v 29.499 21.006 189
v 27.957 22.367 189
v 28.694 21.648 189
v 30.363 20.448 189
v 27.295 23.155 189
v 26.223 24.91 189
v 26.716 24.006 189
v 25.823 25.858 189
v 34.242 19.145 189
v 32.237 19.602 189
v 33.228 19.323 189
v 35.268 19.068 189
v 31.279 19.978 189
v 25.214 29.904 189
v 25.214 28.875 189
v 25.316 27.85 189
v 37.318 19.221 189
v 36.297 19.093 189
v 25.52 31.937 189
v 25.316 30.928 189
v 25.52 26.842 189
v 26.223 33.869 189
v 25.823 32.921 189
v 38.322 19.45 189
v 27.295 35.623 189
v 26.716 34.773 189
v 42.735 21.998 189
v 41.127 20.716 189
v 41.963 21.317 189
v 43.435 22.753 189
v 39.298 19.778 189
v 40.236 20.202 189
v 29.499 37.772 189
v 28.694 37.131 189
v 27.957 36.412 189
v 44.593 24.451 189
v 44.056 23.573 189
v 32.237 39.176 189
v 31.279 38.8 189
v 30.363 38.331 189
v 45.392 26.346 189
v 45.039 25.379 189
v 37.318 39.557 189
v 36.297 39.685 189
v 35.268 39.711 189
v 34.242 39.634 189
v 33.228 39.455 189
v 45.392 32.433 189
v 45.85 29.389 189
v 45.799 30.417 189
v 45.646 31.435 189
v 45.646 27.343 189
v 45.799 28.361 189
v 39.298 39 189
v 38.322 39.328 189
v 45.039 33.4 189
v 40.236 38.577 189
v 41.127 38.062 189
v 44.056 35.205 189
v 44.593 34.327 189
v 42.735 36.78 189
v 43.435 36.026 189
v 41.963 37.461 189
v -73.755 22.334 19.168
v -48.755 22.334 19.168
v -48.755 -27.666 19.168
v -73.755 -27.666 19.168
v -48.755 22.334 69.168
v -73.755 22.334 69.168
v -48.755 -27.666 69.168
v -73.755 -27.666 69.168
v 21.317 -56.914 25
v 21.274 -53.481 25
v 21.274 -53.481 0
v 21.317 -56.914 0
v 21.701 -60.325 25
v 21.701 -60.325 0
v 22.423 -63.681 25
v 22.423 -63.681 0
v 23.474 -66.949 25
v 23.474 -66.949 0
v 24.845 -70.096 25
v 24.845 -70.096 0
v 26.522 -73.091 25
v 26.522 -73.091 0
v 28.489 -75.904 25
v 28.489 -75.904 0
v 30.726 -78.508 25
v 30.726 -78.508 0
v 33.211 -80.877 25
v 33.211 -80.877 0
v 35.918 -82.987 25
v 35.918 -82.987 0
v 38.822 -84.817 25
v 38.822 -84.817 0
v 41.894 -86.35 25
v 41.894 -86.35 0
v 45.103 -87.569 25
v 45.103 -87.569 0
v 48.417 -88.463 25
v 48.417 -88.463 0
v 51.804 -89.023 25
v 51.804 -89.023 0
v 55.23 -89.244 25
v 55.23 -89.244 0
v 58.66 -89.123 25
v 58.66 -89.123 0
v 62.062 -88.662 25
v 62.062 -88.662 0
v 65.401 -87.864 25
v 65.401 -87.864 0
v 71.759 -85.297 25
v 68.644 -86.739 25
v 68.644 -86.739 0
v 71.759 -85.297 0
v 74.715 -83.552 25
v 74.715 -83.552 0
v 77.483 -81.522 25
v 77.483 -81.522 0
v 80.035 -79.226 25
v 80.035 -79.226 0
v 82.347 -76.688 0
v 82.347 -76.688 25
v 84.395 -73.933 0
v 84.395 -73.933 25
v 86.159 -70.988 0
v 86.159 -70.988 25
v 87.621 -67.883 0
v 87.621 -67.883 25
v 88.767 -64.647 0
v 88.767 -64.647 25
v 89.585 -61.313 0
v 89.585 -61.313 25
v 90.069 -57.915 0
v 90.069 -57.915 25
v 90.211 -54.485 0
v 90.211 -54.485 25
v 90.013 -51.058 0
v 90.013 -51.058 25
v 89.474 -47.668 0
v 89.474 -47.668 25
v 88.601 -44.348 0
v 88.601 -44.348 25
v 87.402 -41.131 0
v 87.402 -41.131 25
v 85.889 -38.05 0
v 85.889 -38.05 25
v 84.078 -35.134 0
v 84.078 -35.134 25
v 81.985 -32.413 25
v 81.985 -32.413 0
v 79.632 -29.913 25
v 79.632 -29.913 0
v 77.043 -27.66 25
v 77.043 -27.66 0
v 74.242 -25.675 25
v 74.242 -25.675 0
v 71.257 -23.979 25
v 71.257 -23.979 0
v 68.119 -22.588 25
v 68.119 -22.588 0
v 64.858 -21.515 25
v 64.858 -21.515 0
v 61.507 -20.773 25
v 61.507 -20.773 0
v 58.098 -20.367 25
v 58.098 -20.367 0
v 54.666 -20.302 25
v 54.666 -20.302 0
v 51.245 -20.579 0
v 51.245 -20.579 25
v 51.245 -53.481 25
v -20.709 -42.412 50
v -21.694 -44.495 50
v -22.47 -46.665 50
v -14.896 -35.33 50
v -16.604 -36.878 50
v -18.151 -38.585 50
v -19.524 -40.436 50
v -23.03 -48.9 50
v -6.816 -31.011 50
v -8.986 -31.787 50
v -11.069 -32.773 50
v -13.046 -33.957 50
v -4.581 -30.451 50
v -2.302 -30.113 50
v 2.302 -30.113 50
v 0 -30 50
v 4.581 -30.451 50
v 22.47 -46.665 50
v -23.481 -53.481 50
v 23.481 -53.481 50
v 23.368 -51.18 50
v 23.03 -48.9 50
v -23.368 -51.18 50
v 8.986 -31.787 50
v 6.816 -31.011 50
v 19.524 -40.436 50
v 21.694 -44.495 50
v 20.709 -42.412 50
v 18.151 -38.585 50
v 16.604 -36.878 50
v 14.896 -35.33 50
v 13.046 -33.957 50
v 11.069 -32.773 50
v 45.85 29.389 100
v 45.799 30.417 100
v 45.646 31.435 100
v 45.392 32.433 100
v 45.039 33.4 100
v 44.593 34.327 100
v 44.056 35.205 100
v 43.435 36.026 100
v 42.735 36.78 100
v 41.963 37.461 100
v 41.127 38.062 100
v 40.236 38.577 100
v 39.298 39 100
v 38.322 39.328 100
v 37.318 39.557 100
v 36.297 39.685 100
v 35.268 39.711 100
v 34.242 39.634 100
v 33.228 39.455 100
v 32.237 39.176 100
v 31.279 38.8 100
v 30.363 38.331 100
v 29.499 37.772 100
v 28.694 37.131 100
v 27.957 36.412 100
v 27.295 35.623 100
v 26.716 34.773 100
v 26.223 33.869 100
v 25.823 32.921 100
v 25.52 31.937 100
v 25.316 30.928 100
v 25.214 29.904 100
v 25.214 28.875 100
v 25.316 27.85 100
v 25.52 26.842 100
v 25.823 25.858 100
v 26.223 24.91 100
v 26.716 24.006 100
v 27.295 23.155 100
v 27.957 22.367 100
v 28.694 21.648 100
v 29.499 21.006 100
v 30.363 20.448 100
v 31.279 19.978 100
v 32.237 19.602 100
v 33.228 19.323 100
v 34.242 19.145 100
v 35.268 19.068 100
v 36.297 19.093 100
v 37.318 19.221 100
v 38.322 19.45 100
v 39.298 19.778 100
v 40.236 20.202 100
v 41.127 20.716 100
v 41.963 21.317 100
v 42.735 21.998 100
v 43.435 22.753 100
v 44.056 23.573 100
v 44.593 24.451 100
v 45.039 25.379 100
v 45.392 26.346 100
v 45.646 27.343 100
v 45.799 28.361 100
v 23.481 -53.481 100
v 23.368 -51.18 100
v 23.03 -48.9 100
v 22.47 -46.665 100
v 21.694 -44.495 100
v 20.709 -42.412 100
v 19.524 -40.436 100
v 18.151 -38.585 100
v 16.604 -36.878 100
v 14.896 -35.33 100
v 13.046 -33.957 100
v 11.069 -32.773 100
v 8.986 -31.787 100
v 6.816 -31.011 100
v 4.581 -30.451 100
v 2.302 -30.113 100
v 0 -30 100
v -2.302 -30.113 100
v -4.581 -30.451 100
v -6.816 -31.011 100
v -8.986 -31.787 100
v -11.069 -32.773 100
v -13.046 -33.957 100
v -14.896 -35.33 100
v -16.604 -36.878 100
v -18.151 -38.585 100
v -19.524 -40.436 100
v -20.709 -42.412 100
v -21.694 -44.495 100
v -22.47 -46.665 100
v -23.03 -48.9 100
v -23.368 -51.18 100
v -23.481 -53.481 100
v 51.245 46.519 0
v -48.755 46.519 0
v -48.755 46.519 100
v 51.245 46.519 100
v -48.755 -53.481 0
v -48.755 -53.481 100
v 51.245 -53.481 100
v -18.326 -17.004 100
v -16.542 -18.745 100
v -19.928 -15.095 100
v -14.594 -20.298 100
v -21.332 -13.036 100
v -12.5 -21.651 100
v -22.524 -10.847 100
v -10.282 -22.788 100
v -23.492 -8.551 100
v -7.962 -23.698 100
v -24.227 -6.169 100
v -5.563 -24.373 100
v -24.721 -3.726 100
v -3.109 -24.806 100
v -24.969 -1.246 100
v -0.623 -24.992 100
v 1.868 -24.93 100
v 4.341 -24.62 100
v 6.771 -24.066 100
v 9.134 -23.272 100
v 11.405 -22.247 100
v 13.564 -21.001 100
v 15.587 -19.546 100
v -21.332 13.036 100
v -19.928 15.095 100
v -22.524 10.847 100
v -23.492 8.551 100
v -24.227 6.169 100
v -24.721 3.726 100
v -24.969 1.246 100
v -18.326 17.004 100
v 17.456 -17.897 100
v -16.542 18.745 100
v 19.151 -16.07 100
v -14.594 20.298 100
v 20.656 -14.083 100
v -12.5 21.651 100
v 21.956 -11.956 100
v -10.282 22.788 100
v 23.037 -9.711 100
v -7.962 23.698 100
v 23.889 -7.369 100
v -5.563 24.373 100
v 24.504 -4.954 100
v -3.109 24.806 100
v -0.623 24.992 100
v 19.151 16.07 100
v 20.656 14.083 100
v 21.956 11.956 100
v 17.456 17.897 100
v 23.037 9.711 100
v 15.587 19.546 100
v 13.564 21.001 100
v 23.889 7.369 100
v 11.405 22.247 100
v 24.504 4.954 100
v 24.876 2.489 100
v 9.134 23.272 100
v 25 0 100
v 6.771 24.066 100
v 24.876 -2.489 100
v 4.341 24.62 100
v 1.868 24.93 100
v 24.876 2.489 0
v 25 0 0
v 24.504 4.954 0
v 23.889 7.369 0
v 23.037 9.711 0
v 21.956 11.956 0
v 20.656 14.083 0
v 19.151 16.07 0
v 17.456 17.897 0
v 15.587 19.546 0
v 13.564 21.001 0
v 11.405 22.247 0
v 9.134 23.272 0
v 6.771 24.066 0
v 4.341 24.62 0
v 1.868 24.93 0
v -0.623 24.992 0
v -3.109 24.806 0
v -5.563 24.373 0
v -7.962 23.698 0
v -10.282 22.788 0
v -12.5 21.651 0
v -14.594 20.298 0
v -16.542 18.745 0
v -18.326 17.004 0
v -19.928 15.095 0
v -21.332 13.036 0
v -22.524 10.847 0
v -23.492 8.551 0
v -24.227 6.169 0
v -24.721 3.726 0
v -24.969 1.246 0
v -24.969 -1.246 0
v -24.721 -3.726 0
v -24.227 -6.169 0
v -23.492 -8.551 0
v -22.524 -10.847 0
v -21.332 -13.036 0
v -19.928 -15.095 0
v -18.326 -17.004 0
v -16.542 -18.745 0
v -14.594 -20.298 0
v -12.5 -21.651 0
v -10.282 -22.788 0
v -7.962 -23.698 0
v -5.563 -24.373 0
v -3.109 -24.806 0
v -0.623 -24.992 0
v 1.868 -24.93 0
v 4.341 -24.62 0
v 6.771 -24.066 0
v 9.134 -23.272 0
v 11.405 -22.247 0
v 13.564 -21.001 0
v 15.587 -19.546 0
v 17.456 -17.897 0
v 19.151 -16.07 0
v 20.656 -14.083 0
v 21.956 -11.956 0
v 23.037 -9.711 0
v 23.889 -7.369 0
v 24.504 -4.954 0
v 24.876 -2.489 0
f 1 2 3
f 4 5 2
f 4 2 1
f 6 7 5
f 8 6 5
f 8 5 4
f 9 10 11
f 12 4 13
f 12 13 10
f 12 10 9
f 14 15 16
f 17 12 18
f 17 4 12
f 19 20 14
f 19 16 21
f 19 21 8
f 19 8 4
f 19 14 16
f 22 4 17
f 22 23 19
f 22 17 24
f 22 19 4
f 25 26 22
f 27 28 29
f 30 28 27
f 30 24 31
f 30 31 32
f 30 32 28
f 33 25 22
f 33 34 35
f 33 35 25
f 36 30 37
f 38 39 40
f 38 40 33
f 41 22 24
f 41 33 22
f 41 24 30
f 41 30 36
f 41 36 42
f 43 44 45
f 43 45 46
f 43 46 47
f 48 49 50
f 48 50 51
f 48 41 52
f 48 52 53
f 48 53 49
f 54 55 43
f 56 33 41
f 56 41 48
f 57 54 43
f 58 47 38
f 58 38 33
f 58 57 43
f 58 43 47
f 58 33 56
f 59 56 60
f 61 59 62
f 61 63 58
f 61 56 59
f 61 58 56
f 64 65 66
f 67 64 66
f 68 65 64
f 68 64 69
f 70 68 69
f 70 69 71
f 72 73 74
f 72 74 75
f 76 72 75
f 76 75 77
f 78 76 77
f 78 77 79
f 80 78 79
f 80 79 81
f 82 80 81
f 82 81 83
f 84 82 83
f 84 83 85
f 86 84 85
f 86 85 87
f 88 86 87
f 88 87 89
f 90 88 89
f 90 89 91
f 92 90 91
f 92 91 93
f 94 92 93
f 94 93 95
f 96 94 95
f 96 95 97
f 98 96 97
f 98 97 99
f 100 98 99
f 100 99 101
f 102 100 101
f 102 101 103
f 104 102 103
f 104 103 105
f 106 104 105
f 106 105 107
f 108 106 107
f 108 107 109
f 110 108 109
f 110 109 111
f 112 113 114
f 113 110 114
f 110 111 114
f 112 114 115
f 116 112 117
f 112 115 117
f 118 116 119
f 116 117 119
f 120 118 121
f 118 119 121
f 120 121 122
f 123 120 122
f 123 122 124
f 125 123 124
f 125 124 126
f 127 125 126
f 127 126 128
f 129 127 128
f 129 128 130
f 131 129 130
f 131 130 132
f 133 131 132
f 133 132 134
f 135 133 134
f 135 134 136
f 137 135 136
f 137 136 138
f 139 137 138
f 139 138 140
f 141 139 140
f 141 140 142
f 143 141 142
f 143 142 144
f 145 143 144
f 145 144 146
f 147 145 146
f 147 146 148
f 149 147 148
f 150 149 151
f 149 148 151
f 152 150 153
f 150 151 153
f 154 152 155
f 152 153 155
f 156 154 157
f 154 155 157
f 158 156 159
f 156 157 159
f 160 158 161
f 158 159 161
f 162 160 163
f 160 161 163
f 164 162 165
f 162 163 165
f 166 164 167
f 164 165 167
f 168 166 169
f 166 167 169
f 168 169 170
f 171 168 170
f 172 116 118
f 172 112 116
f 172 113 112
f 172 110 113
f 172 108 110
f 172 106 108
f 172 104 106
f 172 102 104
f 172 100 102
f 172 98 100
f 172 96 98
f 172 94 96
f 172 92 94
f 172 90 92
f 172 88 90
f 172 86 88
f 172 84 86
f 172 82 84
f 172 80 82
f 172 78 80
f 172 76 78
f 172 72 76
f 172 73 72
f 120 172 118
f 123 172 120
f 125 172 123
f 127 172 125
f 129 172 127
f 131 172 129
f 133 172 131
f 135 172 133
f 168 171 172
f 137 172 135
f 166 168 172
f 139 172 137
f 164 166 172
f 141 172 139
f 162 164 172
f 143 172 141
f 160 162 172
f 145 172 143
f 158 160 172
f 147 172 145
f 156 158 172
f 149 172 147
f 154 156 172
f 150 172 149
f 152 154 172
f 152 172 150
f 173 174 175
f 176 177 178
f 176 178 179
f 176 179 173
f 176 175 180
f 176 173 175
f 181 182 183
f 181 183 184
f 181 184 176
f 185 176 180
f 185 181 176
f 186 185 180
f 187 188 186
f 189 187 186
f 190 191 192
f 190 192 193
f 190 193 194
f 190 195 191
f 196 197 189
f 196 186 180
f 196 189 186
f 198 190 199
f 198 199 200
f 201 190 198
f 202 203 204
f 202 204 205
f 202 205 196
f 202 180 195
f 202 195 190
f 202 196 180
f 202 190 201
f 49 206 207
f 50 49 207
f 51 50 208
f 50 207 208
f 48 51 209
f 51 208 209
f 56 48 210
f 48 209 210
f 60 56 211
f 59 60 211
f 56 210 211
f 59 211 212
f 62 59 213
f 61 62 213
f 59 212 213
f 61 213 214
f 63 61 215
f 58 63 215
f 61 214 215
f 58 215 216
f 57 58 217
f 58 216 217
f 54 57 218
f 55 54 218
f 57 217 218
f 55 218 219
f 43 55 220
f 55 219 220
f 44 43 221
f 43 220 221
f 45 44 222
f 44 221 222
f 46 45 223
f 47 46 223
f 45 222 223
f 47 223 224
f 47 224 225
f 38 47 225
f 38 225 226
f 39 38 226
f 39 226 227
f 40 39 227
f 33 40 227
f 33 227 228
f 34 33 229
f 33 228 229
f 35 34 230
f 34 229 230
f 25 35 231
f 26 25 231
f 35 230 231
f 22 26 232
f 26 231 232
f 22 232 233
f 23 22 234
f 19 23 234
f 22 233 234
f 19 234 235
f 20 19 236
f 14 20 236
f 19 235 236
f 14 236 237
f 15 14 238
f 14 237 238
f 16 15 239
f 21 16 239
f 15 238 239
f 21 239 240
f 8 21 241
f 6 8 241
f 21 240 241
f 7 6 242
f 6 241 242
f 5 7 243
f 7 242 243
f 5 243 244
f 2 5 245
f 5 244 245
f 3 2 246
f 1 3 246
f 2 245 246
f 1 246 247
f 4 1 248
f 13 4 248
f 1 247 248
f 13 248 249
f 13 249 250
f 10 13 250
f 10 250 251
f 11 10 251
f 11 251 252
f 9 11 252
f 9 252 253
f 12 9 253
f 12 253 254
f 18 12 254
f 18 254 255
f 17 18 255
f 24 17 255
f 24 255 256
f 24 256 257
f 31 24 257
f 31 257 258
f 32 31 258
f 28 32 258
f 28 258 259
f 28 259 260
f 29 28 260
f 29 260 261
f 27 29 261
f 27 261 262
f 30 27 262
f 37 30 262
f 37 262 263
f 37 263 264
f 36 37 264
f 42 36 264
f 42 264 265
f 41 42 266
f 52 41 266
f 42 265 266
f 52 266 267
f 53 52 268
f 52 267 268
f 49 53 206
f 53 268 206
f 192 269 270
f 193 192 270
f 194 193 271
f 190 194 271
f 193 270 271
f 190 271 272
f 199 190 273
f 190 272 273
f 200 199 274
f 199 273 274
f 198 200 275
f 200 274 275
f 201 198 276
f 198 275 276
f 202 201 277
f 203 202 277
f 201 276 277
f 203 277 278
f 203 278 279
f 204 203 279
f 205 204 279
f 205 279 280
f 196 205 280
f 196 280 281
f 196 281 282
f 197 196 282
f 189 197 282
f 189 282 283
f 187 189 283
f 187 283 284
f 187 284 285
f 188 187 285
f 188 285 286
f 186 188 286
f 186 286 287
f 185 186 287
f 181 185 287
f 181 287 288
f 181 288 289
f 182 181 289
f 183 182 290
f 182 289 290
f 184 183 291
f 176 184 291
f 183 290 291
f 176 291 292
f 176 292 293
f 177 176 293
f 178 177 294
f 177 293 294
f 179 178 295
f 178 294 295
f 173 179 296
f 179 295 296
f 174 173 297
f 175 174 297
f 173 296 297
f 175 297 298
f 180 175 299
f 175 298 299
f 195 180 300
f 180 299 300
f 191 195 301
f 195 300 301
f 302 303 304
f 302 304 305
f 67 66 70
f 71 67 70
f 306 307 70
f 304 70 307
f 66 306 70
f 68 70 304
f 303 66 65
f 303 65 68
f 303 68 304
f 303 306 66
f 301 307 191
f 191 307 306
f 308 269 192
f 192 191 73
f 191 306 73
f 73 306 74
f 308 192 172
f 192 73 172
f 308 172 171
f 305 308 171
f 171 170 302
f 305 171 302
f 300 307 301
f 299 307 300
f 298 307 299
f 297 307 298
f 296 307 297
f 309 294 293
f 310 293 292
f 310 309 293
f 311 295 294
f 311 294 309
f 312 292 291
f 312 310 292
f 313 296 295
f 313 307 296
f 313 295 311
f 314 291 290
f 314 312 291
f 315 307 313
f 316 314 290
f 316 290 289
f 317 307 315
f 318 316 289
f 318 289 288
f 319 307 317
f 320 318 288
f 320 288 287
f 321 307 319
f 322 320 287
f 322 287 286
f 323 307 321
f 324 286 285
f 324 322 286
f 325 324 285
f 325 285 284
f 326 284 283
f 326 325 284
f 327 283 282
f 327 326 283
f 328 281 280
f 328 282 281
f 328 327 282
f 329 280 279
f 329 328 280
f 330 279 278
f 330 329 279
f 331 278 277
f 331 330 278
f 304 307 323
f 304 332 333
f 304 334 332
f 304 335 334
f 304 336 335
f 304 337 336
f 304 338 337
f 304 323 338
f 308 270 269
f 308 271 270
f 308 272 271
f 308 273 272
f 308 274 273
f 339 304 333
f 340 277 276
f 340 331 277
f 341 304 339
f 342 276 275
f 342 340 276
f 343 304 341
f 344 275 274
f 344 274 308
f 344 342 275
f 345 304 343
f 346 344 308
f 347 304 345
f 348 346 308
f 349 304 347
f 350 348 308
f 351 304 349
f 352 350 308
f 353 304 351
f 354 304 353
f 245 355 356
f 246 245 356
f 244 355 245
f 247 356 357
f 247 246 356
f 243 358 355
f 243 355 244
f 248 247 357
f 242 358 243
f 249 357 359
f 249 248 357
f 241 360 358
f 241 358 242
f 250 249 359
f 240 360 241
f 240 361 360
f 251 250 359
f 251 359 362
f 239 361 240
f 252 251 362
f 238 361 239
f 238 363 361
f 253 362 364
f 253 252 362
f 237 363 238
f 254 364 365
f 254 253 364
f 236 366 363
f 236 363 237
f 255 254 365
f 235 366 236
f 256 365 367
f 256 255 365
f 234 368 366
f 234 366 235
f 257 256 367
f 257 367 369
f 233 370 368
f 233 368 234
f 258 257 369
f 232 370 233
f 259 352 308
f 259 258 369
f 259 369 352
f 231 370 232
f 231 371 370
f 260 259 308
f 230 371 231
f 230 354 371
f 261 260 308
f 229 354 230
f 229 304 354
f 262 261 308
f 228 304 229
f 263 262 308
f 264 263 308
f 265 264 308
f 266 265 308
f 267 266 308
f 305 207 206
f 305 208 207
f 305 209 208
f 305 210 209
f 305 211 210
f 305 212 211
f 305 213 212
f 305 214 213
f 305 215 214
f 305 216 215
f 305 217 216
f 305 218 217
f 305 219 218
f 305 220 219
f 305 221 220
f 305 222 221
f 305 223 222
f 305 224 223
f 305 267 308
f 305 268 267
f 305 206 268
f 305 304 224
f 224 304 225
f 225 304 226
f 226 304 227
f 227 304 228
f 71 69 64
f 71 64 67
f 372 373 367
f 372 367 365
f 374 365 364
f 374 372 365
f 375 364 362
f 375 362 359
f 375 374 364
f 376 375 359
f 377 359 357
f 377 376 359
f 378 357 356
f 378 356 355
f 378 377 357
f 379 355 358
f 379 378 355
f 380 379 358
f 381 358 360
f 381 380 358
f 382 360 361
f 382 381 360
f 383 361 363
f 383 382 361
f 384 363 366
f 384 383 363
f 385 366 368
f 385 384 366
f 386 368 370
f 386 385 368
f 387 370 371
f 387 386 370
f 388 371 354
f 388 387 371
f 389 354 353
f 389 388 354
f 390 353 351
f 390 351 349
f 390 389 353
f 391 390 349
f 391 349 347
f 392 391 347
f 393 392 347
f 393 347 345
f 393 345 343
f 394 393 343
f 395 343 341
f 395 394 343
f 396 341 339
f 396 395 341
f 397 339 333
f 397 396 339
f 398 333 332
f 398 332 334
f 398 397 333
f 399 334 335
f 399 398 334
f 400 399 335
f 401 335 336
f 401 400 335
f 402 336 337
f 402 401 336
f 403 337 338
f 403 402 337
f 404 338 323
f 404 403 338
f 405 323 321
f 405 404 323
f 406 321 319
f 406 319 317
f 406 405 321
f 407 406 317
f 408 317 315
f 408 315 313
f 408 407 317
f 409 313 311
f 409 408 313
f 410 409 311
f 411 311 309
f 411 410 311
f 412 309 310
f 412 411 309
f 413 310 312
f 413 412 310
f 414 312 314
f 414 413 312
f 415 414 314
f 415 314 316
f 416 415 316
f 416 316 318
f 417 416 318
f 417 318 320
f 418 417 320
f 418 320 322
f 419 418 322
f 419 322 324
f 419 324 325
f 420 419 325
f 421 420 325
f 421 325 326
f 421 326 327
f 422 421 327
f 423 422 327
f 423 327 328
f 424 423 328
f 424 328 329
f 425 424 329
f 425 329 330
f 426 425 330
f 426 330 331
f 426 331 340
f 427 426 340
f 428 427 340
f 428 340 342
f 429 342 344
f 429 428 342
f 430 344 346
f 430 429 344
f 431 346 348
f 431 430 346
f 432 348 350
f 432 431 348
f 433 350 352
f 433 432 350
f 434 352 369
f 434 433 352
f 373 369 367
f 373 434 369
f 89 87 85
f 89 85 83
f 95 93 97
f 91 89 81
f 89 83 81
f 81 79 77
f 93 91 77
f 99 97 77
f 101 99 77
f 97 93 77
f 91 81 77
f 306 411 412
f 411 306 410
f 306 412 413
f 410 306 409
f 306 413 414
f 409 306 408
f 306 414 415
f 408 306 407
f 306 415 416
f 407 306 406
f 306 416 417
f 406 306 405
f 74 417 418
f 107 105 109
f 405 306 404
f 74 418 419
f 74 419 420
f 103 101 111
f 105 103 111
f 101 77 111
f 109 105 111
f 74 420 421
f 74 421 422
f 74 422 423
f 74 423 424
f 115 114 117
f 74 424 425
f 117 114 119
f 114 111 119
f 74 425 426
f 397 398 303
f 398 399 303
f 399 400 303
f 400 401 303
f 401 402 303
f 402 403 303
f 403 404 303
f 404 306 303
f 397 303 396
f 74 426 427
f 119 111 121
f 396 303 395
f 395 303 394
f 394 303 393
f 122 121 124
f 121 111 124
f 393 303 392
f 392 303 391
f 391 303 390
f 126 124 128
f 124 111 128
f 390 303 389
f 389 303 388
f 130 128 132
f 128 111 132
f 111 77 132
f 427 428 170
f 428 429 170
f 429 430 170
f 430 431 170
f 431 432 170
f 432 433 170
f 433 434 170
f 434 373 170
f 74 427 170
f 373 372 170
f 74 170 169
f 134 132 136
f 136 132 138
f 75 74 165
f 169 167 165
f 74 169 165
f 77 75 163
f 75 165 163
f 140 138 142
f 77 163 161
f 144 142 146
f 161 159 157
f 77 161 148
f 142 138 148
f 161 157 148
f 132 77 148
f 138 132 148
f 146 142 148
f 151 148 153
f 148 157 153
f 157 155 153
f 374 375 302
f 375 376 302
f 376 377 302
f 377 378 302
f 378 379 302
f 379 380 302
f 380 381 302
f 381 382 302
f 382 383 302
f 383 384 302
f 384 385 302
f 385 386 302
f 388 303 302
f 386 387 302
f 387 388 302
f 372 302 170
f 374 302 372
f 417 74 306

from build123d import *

# Parameters (mm, degrees)
F0_W     = 100
F0_H     = 100
F0_R     = 25
F1_DEPTH = 100
F2_R     = 23.481347
F3_DEPTH = 50
F4_W     = 50
F4_H     = 50
F5_DEPTH = 25
F6_R     = 34.48111
F7_DEPTH = 25
F8_R     = 10.324712
F9_DEPTH = 89


with BuildPart() as f1:
    # F0 (on Top) → F1 (new body)
    with BuildSketch(Plane.XY):
        with Locations((1.244521, -3.481347)):
            Rectangle(F0_W, F0_H)
        Circle(F0_R, mode=Mode.SUBTRACT)
    extrude(amount=F1_DEPTH)

    # F2 (on face) → F3 (cut)
    with BuildSketch(Plane.XY.offset(100)):
        with Locations((0, -53.481347)):
            Circle(F2_R)
    extrude(amount=-F3_DEPTH, mode=Mode.SUBTRACT)

    # F4 (on face) → F5 (join)
    with BuildSketch(Plane(origin=(-48.755479, 0, 0), x_dir=(0, -1, 0), z_dir=(-1, 0, 0))):
        with Locations((2.66633, 44.168345)):
            Rectangle(F4_W, F4_H)
    extrude(amount=F5_DEPTH)

    # F6 (on Top) → F7 (join)
    with BuildSketch(Plane.XY):
        with Locations((55.731513, -54.766722)):
            Circle(F6_R)
    extrude(amount=F7_DEPTH)

    # F8 (on face) → F9 (join)
    with BuildSketch(Plane.XY.offset(100)):
        with Locations((35.525516, 29.389268)):
            Circle(F8_R)
    extrude(amount=F9_DEPTH)


solid = f1.part
